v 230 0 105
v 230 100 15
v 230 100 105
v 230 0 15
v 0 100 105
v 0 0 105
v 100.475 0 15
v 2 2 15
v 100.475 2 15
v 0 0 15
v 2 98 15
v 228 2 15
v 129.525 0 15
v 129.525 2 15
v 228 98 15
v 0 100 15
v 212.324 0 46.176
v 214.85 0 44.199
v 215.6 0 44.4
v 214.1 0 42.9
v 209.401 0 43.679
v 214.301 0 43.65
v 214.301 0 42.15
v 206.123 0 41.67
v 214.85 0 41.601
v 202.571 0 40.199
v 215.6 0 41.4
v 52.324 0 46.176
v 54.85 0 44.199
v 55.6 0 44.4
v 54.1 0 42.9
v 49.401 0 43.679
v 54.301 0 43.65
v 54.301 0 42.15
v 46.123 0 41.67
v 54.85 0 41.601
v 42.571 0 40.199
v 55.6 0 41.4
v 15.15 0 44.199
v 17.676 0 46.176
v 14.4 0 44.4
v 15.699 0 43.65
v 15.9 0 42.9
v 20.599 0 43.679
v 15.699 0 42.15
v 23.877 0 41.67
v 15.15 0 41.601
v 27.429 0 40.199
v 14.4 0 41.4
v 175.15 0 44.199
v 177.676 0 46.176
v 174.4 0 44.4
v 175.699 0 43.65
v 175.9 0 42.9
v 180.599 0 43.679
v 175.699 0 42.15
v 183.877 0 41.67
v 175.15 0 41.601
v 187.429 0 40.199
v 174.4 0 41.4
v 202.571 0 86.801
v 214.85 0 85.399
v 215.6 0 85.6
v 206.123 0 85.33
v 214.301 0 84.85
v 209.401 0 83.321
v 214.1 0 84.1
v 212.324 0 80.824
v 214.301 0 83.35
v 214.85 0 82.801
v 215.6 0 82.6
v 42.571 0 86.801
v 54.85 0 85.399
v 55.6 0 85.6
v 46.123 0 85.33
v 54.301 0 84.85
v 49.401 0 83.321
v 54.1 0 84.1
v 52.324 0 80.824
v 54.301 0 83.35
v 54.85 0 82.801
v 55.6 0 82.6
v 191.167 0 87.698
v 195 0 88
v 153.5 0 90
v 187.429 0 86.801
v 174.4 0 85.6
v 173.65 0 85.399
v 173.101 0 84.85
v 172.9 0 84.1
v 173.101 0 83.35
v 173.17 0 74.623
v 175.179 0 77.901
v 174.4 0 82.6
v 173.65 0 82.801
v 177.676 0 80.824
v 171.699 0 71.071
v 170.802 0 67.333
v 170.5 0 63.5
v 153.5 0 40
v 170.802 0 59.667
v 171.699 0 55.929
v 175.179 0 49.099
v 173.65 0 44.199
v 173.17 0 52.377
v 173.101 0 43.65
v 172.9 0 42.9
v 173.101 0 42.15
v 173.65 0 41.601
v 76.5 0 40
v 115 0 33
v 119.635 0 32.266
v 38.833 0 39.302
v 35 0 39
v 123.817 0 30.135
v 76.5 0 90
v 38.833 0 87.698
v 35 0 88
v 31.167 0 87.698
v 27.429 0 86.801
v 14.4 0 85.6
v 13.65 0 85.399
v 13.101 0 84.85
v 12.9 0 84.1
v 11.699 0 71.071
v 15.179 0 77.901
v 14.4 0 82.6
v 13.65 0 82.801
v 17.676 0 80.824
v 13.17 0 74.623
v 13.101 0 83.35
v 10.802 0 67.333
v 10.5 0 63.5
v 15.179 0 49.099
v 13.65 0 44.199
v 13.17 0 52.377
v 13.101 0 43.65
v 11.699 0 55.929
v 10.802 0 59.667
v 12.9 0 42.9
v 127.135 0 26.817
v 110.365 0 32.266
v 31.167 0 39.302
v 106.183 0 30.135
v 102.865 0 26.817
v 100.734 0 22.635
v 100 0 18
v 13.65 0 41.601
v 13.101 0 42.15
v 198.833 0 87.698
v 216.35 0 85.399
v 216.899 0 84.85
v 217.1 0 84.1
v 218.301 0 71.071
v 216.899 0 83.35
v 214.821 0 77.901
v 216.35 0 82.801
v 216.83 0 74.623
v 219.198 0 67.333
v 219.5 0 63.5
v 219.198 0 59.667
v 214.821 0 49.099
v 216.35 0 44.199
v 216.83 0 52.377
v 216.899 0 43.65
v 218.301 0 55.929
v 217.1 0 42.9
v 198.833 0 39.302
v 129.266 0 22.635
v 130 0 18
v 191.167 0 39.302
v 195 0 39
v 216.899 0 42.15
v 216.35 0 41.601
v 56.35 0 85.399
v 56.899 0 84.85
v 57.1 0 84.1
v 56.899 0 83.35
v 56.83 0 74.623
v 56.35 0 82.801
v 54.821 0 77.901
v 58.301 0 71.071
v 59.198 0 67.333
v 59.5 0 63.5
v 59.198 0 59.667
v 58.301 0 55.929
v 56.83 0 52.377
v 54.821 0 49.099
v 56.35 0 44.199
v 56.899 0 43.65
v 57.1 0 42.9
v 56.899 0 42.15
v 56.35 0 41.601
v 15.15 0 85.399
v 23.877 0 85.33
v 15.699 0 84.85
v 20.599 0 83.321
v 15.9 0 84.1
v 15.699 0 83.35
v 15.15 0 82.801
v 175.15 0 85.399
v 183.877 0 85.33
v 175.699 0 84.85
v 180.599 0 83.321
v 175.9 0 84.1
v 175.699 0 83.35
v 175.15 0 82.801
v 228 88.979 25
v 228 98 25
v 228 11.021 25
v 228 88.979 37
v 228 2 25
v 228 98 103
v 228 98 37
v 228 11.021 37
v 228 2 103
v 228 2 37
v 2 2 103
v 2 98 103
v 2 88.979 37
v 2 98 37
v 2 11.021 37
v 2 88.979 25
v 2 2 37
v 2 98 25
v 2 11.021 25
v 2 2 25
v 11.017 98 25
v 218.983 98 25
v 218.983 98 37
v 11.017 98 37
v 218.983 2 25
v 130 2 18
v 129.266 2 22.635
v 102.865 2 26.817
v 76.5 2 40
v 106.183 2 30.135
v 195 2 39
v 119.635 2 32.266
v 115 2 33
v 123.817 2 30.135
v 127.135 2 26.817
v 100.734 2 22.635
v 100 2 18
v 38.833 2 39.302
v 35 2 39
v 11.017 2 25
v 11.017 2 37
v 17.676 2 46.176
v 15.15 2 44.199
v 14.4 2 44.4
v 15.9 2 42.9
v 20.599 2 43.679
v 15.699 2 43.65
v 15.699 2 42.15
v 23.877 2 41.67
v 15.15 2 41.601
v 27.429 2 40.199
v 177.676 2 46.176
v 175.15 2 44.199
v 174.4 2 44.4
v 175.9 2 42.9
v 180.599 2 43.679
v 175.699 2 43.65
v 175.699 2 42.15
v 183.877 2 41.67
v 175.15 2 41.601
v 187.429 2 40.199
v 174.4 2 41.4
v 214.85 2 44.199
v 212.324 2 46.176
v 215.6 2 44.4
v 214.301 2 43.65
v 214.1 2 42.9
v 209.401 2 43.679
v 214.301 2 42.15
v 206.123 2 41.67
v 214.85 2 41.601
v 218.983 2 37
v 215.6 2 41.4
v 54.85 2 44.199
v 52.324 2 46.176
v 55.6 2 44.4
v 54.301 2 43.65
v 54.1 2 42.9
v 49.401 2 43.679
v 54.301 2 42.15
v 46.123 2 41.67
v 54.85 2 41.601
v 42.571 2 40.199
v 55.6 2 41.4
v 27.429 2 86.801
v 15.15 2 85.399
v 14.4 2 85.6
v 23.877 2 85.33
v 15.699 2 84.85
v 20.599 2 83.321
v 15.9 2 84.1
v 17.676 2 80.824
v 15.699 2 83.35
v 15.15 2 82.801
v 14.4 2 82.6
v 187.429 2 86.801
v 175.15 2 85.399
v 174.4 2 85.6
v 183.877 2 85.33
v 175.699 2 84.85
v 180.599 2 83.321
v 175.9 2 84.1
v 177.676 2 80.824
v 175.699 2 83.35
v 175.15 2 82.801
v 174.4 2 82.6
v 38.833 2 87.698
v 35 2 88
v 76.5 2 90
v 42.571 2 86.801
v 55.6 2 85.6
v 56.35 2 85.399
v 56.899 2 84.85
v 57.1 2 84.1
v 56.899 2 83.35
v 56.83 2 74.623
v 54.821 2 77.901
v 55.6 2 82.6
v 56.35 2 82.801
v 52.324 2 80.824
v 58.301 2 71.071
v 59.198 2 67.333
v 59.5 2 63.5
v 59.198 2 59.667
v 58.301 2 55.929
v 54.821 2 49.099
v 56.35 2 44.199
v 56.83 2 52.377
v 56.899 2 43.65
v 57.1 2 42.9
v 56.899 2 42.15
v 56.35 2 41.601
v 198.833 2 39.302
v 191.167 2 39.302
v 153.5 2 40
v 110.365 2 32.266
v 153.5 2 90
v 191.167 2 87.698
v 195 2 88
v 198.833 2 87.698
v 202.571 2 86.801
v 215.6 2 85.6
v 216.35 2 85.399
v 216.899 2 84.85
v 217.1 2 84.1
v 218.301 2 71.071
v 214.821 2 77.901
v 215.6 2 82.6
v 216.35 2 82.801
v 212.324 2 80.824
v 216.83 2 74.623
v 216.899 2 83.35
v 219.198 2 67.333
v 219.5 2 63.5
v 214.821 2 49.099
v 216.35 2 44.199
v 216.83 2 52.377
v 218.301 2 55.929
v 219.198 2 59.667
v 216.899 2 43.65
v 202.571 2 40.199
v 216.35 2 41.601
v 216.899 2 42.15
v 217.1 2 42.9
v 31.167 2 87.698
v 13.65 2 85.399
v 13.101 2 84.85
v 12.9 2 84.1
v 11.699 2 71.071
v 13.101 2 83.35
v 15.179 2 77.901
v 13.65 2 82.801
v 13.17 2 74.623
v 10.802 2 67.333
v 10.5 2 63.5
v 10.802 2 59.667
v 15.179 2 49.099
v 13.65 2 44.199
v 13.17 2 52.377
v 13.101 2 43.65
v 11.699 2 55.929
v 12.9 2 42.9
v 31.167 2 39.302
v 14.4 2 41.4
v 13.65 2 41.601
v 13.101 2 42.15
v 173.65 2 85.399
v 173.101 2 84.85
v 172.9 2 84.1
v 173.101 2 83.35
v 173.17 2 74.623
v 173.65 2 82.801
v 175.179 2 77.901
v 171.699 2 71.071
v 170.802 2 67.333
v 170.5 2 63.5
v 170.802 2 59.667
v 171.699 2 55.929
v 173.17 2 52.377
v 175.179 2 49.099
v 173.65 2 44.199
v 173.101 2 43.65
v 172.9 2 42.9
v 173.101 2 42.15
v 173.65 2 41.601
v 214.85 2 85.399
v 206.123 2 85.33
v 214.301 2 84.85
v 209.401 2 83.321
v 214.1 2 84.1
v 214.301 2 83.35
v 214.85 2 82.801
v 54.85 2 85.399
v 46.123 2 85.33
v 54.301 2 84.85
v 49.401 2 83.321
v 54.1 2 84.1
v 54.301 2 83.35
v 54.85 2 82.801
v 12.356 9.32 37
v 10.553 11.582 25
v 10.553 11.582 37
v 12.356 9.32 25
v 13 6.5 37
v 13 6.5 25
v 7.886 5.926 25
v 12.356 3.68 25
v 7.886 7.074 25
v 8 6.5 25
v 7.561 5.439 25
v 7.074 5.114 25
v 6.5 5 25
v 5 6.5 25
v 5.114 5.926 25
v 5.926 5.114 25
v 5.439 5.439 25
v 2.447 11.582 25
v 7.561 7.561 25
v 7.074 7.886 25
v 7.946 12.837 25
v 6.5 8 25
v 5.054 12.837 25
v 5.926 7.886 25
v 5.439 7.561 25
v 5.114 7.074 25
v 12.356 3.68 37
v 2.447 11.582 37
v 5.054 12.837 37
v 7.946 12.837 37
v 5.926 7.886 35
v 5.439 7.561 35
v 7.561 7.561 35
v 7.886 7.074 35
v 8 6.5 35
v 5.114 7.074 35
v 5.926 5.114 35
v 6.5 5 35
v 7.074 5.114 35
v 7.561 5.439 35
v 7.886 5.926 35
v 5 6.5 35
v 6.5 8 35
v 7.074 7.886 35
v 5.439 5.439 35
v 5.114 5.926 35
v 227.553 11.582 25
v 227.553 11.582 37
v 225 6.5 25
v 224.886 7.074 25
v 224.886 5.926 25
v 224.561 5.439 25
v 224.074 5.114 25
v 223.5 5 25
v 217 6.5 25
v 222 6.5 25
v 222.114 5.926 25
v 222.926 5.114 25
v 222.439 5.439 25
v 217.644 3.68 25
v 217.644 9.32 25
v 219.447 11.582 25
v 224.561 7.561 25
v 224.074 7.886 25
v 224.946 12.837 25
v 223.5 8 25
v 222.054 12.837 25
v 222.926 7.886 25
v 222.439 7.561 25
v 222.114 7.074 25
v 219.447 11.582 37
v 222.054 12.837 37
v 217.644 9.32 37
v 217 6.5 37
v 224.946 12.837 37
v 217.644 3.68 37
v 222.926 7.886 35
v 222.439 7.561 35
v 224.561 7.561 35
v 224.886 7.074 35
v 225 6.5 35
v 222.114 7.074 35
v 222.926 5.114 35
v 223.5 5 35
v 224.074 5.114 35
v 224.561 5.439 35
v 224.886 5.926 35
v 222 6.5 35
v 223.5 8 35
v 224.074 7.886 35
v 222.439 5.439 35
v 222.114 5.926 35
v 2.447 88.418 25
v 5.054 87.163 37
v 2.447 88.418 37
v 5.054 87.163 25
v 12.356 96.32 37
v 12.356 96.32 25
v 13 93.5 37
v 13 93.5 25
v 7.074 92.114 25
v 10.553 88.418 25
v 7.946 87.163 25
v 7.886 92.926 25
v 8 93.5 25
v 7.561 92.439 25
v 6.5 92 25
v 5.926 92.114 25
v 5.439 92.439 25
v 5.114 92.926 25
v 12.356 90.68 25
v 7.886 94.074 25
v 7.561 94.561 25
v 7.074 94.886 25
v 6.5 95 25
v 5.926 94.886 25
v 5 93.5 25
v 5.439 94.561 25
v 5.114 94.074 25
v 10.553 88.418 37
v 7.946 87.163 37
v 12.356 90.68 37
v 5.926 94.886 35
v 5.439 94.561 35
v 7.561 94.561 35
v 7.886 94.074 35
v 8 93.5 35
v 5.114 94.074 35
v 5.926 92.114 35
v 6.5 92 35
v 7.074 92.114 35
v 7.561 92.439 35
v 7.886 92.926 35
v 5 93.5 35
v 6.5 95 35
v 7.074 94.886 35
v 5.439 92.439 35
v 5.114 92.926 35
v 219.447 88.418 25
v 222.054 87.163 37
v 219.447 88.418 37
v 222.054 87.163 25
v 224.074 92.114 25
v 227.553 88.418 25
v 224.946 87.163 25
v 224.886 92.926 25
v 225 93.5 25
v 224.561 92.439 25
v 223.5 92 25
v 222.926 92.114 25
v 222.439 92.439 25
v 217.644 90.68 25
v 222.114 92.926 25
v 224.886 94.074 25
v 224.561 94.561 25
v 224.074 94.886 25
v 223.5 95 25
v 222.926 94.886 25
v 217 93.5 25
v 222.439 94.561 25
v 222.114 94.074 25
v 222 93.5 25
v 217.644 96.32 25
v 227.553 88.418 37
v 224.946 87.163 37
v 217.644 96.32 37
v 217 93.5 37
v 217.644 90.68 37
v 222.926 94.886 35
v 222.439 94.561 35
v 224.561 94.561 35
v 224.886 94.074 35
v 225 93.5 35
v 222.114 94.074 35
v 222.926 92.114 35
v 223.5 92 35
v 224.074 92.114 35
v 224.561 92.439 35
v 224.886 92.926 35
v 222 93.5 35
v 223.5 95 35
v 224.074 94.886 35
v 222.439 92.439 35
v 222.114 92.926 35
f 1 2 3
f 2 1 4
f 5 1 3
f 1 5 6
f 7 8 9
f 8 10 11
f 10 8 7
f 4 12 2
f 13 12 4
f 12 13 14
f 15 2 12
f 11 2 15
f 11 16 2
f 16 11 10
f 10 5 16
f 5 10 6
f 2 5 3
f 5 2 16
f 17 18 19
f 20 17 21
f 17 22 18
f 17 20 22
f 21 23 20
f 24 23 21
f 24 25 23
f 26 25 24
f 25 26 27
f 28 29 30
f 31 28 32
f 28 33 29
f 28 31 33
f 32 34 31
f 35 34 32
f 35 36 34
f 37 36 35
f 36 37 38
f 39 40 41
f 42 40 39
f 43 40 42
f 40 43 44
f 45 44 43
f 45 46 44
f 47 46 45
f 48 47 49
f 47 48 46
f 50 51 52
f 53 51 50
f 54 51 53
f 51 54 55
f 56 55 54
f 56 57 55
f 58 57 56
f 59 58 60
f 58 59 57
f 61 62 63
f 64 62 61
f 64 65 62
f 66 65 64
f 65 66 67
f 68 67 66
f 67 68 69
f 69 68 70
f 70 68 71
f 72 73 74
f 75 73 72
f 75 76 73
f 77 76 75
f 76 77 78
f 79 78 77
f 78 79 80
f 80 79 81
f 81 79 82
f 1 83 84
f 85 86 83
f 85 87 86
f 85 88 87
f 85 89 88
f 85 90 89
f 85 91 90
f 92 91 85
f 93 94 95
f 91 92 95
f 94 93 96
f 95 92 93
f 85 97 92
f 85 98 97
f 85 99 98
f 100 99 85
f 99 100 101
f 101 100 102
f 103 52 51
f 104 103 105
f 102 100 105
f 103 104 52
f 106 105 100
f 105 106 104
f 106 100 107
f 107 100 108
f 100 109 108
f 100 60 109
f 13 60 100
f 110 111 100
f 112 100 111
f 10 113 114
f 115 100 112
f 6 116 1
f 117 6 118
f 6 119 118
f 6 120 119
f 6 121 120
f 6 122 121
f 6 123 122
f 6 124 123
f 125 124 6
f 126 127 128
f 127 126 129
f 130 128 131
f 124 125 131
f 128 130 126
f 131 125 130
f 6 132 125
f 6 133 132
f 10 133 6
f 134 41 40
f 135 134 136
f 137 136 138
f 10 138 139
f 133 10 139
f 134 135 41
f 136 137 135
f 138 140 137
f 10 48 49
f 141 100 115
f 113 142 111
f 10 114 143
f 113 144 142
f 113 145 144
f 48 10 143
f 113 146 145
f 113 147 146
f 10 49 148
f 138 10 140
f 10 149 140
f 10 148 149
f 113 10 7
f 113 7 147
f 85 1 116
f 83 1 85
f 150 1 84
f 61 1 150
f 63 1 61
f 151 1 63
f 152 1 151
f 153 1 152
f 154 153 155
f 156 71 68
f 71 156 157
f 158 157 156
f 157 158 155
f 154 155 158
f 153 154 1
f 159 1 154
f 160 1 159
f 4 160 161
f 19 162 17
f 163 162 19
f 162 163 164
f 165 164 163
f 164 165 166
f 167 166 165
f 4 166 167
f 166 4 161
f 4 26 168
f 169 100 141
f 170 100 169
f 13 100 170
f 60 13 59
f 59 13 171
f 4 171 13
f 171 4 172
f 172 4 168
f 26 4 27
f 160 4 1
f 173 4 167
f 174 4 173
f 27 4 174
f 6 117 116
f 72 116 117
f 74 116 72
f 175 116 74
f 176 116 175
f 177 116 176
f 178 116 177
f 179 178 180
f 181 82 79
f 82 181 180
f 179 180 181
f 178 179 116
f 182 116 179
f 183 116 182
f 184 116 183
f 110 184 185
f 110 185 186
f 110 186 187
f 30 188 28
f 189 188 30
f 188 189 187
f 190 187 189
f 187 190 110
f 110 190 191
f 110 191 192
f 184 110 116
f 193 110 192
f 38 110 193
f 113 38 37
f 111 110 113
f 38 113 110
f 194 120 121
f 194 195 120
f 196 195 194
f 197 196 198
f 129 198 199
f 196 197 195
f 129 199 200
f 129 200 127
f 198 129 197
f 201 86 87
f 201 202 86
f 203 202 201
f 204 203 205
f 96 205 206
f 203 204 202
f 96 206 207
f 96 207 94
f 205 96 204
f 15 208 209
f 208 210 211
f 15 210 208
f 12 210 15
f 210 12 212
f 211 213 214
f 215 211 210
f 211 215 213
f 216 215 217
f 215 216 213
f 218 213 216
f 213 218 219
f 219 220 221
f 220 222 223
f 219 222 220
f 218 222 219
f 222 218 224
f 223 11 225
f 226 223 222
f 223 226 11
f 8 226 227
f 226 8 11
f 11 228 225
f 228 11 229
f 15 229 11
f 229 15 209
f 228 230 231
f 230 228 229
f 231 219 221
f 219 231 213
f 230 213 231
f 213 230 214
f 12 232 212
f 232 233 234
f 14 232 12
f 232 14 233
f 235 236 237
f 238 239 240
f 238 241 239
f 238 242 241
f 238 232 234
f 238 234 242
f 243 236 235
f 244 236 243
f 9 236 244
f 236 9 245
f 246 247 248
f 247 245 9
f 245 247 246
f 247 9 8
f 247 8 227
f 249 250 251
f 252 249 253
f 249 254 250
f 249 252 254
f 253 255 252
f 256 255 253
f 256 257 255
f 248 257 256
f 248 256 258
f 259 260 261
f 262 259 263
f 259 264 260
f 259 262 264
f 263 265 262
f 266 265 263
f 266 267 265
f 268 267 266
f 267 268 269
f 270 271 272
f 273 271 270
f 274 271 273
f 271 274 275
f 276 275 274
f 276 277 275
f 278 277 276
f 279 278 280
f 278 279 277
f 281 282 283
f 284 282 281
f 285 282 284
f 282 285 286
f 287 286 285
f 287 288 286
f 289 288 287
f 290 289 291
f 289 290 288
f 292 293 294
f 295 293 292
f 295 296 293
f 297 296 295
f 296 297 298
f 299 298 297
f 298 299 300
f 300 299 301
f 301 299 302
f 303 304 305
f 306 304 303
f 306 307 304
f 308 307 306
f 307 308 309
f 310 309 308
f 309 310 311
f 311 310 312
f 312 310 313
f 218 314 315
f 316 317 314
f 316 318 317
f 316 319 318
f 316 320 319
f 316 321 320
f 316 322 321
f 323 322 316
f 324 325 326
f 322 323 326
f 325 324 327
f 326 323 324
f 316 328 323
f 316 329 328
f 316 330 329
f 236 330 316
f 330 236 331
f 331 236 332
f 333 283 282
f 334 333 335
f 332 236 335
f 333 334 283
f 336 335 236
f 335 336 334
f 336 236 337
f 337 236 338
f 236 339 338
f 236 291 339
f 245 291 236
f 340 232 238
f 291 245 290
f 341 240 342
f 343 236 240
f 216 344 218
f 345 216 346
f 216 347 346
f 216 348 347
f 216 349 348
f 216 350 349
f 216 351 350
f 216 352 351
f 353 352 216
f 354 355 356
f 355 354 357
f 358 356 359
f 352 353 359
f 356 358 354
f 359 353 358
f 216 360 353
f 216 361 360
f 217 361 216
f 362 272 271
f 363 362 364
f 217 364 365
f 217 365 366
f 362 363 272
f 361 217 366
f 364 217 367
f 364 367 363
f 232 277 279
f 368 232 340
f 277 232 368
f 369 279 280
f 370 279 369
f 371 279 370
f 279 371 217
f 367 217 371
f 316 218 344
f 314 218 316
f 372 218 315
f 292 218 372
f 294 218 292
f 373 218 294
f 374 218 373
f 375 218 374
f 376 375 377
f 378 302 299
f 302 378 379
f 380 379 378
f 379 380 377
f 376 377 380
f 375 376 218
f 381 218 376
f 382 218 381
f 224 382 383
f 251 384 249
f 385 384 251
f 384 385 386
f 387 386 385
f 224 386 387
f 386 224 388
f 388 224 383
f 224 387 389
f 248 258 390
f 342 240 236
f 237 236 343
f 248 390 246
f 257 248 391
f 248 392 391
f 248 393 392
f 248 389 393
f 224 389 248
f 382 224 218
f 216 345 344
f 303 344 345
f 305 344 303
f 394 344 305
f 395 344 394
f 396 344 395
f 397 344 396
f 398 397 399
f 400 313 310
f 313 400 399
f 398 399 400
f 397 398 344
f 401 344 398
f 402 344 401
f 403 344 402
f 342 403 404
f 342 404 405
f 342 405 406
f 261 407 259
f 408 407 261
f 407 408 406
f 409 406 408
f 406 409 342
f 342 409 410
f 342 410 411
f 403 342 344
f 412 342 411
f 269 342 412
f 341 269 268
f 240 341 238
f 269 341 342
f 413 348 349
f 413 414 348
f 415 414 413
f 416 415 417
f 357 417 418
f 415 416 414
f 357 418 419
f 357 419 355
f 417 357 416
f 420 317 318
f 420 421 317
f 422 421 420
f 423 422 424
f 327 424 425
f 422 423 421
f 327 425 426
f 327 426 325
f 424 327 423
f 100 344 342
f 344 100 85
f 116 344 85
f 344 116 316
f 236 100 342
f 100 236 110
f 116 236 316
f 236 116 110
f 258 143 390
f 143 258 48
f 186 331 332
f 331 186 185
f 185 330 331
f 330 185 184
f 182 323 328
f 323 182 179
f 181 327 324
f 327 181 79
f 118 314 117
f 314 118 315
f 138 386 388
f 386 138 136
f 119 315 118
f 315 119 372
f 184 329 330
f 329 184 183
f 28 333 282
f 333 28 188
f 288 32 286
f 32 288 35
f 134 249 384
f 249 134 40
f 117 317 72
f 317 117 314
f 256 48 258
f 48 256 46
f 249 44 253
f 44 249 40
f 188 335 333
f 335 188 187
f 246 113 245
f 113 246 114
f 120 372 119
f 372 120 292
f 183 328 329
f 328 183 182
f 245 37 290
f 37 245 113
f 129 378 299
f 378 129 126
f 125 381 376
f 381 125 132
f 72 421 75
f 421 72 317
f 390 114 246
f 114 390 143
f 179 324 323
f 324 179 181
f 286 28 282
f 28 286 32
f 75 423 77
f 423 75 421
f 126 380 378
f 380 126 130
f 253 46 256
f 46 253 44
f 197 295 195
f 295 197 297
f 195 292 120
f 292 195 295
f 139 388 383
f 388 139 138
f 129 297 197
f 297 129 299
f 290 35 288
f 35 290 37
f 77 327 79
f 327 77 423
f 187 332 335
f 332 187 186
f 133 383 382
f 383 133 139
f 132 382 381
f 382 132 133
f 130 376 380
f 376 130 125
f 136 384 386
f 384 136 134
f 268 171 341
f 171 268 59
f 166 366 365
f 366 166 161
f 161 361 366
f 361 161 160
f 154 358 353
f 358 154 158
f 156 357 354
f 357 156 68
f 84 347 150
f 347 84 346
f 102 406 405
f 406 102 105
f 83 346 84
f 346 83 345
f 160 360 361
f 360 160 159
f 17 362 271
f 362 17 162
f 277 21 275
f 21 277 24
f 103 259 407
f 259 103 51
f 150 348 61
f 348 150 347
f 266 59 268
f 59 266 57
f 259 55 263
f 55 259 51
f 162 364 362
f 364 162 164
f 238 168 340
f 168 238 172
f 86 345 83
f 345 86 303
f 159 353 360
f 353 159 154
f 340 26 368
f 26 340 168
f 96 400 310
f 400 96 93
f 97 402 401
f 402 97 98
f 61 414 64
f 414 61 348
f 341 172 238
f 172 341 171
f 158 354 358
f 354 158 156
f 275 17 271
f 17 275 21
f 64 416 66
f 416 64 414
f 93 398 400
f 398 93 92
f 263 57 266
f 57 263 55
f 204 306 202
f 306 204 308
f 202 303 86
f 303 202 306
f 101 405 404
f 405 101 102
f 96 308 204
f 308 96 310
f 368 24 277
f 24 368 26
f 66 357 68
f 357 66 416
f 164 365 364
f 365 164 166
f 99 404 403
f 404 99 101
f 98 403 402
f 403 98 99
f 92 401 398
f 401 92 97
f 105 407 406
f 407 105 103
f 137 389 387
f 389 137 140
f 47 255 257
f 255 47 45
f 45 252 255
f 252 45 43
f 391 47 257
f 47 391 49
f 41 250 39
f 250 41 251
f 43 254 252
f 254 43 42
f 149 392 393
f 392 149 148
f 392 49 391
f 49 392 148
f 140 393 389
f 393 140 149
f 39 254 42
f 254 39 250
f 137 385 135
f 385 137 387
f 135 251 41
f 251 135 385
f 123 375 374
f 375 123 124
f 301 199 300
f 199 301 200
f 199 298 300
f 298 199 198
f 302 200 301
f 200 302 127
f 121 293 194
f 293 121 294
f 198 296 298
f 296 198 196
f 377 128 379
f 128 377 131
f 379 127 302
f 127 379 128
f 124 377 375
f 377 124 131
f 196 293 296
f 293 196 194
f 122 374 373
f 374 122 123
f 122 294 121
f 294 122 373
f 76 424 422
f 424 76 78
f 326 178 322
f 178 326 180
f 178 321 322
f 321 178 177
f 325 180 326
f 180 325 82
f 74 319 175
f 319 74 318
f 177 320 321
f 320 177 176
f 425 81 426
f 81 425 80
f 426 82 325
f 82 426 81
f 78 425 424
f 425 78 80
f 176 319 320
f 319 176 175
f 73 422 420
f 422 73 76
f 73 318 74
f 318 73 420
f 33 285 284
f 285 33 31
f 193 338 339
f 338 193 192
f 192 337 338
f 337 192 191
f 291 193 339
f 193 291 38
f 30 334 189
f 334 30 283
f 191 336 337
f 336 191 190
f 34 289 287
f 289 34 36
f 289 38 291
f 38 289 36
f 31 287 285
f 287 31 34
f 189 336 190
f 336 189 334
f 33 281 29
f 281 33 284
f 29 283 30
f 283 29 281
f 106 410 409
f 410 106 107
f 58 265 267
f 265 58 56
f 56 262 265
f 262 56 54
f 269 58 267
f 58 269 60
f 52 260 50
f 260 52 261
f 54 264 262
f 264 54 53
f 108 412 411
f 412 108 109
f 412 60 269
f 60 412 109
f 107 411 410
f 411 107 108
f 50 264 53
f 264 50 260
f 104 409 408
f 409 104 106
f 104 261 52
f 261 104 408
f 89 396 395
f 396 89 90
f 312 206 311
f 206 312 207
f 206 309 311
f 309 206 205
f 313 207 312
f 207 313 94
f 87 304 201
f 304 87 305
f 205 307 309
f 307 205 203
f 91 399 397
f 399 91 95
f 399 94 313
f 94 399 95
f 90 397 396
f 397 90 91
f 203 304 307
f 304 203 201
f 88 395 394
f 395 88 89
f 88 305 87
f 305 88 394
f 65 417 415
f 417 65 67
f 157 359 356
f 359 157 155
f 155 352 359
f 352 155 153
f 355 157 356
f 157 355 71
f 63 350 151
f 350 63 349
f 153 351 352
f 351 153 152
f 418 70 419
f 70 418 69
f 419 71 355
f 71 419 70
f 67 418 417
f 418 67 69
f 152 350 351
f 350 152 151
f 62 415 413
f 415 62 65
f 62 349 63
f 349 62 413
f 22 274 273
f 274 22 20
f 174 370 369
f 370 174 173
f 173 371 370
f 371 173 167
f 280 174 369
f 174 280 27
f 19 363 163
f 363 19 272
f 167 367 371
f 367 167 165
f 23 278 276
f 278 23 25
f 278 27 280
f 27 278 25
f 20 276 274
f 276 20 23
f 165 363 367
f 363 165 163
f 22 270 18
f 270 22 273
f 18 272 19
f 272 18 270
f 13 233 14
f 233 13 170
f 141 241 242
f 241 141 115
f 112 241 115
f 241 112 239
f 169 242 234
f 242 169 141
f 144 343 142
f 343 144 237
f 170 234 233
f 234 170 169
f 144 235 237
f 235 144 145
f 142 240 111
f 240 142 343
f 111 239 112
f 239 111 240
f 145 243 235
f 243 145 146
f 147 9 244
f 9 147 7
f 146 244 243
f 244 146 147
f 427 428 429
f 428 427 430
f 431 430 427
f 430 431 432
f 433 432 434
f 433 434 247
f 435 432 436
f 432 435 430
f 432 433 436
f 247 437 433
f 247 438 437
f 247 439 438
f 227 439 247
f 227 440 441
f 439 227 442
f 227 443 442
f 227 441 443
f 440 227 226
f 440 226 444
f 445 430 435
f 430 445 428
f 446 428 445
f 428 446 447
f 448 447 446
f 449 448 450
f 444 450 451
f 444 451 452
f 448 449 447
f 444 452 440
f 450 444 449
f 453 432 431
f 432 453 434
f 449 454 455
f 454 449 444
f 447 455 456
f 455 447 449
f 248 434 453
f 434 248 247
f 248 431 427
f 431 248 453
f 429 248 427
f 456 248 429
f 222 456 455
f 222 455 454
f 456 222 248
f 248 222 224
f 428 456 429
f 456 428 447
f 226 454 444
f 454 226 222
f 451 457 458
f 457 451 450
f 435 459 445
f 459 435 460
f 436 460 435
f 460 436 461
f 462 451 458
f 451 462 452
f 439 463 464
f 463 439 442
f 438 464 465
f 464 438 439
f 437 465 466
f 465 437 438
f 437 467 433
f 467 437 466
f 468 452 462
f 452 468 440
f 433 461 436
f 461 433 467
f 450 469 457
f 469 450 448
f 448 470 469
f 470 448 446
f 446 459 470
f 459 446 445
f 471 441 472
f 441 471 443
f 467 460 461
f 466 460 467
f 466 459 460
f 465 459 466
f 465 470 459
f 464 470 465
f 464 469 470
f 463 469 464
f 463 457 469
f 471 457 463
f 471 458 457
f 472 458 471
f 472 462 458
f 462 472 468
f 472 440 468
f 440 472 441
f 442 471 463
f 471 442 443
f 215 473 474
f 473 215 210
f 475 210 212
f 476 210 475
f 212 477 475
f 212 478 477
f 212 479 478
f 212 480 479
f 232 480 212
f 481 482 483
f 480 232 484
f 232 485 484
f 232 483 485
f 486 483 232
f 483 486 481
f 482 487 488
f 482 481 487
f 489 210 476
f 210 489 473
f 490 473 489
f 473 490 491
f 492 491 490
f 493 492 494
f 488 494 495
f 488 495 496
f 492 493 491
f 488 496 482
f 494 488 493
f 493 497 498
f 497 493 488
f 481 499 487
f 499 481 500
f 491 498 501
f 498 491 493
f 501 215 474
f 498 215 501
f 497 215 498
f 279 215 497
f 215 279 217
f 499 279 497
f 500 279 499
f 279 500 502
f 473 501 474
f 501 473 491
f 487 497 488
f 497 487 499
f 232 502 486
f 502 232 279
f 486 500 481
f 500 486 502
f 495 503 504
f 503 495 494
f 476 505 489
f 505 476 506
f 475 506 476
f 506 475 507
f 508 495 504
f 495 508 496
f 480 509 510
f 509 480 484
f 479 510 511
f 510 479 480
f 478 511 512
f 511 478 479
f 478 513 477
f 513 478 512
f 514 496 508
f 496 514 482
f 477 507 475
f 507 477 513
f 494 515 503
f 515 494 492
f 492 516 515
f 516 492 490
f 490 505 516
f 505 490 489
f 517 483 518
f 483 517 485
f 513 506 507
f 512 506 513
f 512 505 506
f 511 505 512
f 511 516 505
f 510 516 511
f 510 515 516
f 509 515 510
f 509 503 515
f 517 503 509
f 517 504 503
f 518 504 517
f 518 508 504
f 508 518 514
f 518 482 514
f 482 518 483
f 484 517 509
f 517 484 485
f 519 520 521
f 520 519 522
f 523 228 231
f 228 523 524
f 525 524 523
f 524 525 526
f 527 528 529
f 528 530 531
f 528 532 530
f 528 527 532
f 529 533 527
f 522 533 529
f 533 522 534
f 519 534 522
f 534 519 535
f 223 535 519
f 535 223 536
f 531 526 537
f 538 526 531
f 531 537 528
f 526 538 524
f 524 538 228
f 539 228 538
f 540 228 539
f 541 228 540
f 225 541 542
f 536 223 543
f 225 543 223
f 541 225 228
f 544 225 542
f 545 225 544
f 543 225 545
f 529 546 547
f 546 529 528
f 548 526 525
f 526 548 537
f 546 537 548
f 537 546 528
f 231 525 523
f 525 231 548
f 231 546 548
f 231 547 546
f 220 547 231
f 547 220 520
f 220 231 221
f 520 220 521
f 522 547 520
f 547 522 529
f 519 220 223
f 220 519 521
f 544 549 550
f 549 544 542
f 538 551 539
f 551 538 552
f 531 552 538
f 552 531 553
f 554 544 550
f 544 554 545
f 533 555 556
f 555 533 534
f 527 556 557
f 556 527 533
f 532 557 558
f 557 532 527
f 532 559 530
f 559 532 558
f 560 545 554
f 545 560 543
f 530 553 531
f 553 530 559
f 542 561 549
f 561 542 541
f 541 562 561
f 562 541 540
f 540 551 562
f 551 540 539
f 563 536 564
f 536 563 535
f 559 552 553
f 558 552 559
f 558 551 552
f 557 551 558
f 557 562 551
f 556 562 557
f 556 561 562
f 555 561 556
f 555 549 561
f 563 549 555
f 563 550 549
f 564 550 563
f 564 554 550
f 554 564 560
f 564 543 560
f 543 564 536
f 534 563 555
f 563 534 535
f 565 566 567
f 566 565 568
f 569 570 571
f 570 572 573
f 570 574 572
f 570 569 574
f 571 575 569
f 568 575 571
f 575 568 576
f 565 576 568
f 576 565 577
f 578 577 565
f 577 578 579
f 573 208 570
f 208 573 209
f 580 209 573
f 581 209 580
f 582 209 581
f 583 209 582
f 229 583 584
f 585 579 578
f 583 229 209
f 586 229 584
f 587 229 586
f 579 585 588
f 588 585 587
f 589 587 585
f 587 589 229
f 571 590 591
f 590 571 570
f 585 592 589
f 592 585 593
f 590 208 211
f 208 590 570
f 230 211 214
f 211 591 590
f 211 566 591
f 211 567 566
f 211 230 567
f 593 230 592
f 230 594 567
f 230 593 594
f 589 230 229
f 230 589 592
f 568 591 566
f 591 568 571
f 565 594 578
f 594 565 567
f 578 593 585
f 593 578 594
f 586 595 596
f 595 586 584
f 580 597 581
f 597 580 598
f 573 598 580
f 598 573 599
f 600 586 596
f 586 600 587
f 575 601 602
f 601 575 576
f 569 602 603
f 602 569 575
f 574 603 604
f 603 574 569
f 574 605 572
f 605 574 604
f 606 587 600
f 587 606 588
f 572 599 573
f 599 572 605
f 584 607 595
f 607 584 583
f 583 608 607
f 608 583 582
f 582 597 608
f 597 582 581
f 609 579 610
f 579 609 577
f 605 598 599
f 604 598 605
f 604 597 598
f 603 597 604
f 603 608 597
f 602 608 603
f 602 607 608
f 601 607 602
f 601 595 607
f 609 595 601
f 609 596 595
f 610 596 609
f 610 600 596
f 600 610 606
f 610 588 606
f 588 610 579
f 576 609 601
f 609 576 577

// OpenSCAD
case_width = 230;
case_depth = 100;
case_height = 90;
bottom_rim = 15;
wall_thickness = 2;
lcd_width = 77;
lcd_height = 50;
top_margin = 15;
bottom_margin = 3;
speaker_dims = 53;
speaker_hole = 49;
speaker_gap = 15;
screw_diameter=3;
spkr_hole_spacing=4.4;
knob_diameter = 30;
screw_cylinder_diameter=13;
screw_head_diameter=5;
bottom_inset=10;

module top_lid() {
    difference(){
        cube([case_width, case_depth, case_height]);
        translate([wall_thickness, wall_thickness, -wall_thickness])
            cube([case_width-2*wall_thickness, case_depth-2*wall_thickness, case_height]);
    }
}

module speaker(x_pos){
    translate([x_pos,0, case_height-top_margin-speaker_dims/2])
        rotate([-90, 0, 0])
            cylinder(h=wall_thickness*2, r=speaker_hole/2, $fn=40);
}

module screw_hole(x_pos, z_pos){
    translate([x_pos, -wall_thickness, z_pos])
        rotate([-90, 0, 0])
            cylinder(h=wall_thickness*2, r=screw_diameter/2, $fn=12);
}

module volume_knob_inset(){
    
    translate([case_width/2, 0, -bottom_rim + knob_diameter/2 + bottom_margin])
        rotate([-90, 0, 0])
            cylinder(h=wall_thickness*2, r=knob_diameter/2, $fn=20);
}

module screw_cylinder(position){
    translate(position)
        translate([0, 0, bottom_rim+bottom_inset])
            difference(){
                //case_height-wall_thickness-bottom_inset
                cylinder(h=12, r=screw_cylinder_diameter/2, $fn=14);
                cylinder(h=10, r=screw_diameter/2, $fn=16);
            }
}

translate([0, 0, bottom_rim])
    difference(){
        // Top lid inc difference
        top_lid();
        
        // LCD
        translate([(case_width/2) - (lcd_width/2), 0,case_height-top_margin-lcd_height])
            cube([lcd_width, wall_thickness, lcd_height]);
        
        // Speakers
        left_spkr_x = (case_width/2)-(lcd_width/2)-speaker_dims/2-speaker_gap;
        right_spkr_x = (case_width/2)+(lcd_width/2)+speaker_dims/2+speaker_gap;
        spkr_z = case_height-top_margin-speaker_dims/2;
        speaker(left_spkr_x);
        speaker(right_spkr_x);
        
        // Speaker screw holes
        // Left
        // Left bottom left
        screw_hole(left_spkr_x - speaker_dims/2 + screw_diameter/2 + spkr_hole_spacing, spkr_z - speaker_dims/2 + screw_diameter/2 + spkr_hole_spacing);
        // Left top left
        screw_hole(left_spkr_x - speaker_dims/2 + screw_diameter/2 + spkr_hole_spacing, spkr_z + speaker_dims/2 - screw_diameter/2 - spkr_hole_spacing);
        // Left top right
        screw_hole(left_spkr_x + speaker_dims/2 - screw_diameter/2 - spkr_hole_spacing, spkr_z + speaker_dims/2 - screw_diameter/2 - spkr_hole_spacing);
        // Left bottom right
        screw_hole(left_spkr_x + speaker_dims/2 - screw_diameter/2 - spkr_hole_spacing, spkr_z - speaker_dims/2 + screw_diameter/2 + spkr_hole_spacing);
        
        // Right
        // Right bottom left
        screw_hole(right_spkr_x - speaker_dims/2 + screw_diameter/2 + spkr_hole_spacing, spkr_z - speaker_dims/2 + screw_diameter/2 + spkr_hole_spacing);
        // Right top left
        screw_hole(right_spkr_x - speaker_dims/2 + screw_diameter/2 + spkr_hole_spacing, spkr_z + speaker_dims/2 - screw_diameter/2 - spkr_hole_spacing);
        // Right top right
        screw_hole(right_spkr_x + speaker_dims/2 - screw_diameter/2 - spkr_hole_spacing, spkr_z + speaker_dims/2 - screw_diameter/2 - spkr_hole_spacing);
        // Right bottom right
        screw_hole(right_spkr_x + speaker_dims/2 - screw_diameter/2 - spkr_hole_spacing, spkr_z - speaker_dims/2 + screw_diameter/2 + spkr_hole_spacing);
        
        // Volume knob inset
        volume_knob_inset();
        
        
    }
    // Screw cylinders
    // Front left
    screw_cylinder([wall_thickness*2 + screw_head_diameter/2, wall_thickness*2 + screw_head_diameter/2, 0]);
    // Front right
    screw_cylinder([case_width-screw_head_diameter/2 - wall_thickness*2, wall_thickness*2+screw_head_diameter/2, 0]);
    // Rear left
    screw_cylinder([wall_thickness*2 + screw_head_diameter/2, case_depth-screw_head_diameter/2-wall_thickness*2, 0]);
    // Rear right
    screw_cylinder([case_width-screw_head_diameter/2 - wall_thickness*2, case_depth-screw_head_diameter/2-wall_thickness*2, 0]);
    
    
    
